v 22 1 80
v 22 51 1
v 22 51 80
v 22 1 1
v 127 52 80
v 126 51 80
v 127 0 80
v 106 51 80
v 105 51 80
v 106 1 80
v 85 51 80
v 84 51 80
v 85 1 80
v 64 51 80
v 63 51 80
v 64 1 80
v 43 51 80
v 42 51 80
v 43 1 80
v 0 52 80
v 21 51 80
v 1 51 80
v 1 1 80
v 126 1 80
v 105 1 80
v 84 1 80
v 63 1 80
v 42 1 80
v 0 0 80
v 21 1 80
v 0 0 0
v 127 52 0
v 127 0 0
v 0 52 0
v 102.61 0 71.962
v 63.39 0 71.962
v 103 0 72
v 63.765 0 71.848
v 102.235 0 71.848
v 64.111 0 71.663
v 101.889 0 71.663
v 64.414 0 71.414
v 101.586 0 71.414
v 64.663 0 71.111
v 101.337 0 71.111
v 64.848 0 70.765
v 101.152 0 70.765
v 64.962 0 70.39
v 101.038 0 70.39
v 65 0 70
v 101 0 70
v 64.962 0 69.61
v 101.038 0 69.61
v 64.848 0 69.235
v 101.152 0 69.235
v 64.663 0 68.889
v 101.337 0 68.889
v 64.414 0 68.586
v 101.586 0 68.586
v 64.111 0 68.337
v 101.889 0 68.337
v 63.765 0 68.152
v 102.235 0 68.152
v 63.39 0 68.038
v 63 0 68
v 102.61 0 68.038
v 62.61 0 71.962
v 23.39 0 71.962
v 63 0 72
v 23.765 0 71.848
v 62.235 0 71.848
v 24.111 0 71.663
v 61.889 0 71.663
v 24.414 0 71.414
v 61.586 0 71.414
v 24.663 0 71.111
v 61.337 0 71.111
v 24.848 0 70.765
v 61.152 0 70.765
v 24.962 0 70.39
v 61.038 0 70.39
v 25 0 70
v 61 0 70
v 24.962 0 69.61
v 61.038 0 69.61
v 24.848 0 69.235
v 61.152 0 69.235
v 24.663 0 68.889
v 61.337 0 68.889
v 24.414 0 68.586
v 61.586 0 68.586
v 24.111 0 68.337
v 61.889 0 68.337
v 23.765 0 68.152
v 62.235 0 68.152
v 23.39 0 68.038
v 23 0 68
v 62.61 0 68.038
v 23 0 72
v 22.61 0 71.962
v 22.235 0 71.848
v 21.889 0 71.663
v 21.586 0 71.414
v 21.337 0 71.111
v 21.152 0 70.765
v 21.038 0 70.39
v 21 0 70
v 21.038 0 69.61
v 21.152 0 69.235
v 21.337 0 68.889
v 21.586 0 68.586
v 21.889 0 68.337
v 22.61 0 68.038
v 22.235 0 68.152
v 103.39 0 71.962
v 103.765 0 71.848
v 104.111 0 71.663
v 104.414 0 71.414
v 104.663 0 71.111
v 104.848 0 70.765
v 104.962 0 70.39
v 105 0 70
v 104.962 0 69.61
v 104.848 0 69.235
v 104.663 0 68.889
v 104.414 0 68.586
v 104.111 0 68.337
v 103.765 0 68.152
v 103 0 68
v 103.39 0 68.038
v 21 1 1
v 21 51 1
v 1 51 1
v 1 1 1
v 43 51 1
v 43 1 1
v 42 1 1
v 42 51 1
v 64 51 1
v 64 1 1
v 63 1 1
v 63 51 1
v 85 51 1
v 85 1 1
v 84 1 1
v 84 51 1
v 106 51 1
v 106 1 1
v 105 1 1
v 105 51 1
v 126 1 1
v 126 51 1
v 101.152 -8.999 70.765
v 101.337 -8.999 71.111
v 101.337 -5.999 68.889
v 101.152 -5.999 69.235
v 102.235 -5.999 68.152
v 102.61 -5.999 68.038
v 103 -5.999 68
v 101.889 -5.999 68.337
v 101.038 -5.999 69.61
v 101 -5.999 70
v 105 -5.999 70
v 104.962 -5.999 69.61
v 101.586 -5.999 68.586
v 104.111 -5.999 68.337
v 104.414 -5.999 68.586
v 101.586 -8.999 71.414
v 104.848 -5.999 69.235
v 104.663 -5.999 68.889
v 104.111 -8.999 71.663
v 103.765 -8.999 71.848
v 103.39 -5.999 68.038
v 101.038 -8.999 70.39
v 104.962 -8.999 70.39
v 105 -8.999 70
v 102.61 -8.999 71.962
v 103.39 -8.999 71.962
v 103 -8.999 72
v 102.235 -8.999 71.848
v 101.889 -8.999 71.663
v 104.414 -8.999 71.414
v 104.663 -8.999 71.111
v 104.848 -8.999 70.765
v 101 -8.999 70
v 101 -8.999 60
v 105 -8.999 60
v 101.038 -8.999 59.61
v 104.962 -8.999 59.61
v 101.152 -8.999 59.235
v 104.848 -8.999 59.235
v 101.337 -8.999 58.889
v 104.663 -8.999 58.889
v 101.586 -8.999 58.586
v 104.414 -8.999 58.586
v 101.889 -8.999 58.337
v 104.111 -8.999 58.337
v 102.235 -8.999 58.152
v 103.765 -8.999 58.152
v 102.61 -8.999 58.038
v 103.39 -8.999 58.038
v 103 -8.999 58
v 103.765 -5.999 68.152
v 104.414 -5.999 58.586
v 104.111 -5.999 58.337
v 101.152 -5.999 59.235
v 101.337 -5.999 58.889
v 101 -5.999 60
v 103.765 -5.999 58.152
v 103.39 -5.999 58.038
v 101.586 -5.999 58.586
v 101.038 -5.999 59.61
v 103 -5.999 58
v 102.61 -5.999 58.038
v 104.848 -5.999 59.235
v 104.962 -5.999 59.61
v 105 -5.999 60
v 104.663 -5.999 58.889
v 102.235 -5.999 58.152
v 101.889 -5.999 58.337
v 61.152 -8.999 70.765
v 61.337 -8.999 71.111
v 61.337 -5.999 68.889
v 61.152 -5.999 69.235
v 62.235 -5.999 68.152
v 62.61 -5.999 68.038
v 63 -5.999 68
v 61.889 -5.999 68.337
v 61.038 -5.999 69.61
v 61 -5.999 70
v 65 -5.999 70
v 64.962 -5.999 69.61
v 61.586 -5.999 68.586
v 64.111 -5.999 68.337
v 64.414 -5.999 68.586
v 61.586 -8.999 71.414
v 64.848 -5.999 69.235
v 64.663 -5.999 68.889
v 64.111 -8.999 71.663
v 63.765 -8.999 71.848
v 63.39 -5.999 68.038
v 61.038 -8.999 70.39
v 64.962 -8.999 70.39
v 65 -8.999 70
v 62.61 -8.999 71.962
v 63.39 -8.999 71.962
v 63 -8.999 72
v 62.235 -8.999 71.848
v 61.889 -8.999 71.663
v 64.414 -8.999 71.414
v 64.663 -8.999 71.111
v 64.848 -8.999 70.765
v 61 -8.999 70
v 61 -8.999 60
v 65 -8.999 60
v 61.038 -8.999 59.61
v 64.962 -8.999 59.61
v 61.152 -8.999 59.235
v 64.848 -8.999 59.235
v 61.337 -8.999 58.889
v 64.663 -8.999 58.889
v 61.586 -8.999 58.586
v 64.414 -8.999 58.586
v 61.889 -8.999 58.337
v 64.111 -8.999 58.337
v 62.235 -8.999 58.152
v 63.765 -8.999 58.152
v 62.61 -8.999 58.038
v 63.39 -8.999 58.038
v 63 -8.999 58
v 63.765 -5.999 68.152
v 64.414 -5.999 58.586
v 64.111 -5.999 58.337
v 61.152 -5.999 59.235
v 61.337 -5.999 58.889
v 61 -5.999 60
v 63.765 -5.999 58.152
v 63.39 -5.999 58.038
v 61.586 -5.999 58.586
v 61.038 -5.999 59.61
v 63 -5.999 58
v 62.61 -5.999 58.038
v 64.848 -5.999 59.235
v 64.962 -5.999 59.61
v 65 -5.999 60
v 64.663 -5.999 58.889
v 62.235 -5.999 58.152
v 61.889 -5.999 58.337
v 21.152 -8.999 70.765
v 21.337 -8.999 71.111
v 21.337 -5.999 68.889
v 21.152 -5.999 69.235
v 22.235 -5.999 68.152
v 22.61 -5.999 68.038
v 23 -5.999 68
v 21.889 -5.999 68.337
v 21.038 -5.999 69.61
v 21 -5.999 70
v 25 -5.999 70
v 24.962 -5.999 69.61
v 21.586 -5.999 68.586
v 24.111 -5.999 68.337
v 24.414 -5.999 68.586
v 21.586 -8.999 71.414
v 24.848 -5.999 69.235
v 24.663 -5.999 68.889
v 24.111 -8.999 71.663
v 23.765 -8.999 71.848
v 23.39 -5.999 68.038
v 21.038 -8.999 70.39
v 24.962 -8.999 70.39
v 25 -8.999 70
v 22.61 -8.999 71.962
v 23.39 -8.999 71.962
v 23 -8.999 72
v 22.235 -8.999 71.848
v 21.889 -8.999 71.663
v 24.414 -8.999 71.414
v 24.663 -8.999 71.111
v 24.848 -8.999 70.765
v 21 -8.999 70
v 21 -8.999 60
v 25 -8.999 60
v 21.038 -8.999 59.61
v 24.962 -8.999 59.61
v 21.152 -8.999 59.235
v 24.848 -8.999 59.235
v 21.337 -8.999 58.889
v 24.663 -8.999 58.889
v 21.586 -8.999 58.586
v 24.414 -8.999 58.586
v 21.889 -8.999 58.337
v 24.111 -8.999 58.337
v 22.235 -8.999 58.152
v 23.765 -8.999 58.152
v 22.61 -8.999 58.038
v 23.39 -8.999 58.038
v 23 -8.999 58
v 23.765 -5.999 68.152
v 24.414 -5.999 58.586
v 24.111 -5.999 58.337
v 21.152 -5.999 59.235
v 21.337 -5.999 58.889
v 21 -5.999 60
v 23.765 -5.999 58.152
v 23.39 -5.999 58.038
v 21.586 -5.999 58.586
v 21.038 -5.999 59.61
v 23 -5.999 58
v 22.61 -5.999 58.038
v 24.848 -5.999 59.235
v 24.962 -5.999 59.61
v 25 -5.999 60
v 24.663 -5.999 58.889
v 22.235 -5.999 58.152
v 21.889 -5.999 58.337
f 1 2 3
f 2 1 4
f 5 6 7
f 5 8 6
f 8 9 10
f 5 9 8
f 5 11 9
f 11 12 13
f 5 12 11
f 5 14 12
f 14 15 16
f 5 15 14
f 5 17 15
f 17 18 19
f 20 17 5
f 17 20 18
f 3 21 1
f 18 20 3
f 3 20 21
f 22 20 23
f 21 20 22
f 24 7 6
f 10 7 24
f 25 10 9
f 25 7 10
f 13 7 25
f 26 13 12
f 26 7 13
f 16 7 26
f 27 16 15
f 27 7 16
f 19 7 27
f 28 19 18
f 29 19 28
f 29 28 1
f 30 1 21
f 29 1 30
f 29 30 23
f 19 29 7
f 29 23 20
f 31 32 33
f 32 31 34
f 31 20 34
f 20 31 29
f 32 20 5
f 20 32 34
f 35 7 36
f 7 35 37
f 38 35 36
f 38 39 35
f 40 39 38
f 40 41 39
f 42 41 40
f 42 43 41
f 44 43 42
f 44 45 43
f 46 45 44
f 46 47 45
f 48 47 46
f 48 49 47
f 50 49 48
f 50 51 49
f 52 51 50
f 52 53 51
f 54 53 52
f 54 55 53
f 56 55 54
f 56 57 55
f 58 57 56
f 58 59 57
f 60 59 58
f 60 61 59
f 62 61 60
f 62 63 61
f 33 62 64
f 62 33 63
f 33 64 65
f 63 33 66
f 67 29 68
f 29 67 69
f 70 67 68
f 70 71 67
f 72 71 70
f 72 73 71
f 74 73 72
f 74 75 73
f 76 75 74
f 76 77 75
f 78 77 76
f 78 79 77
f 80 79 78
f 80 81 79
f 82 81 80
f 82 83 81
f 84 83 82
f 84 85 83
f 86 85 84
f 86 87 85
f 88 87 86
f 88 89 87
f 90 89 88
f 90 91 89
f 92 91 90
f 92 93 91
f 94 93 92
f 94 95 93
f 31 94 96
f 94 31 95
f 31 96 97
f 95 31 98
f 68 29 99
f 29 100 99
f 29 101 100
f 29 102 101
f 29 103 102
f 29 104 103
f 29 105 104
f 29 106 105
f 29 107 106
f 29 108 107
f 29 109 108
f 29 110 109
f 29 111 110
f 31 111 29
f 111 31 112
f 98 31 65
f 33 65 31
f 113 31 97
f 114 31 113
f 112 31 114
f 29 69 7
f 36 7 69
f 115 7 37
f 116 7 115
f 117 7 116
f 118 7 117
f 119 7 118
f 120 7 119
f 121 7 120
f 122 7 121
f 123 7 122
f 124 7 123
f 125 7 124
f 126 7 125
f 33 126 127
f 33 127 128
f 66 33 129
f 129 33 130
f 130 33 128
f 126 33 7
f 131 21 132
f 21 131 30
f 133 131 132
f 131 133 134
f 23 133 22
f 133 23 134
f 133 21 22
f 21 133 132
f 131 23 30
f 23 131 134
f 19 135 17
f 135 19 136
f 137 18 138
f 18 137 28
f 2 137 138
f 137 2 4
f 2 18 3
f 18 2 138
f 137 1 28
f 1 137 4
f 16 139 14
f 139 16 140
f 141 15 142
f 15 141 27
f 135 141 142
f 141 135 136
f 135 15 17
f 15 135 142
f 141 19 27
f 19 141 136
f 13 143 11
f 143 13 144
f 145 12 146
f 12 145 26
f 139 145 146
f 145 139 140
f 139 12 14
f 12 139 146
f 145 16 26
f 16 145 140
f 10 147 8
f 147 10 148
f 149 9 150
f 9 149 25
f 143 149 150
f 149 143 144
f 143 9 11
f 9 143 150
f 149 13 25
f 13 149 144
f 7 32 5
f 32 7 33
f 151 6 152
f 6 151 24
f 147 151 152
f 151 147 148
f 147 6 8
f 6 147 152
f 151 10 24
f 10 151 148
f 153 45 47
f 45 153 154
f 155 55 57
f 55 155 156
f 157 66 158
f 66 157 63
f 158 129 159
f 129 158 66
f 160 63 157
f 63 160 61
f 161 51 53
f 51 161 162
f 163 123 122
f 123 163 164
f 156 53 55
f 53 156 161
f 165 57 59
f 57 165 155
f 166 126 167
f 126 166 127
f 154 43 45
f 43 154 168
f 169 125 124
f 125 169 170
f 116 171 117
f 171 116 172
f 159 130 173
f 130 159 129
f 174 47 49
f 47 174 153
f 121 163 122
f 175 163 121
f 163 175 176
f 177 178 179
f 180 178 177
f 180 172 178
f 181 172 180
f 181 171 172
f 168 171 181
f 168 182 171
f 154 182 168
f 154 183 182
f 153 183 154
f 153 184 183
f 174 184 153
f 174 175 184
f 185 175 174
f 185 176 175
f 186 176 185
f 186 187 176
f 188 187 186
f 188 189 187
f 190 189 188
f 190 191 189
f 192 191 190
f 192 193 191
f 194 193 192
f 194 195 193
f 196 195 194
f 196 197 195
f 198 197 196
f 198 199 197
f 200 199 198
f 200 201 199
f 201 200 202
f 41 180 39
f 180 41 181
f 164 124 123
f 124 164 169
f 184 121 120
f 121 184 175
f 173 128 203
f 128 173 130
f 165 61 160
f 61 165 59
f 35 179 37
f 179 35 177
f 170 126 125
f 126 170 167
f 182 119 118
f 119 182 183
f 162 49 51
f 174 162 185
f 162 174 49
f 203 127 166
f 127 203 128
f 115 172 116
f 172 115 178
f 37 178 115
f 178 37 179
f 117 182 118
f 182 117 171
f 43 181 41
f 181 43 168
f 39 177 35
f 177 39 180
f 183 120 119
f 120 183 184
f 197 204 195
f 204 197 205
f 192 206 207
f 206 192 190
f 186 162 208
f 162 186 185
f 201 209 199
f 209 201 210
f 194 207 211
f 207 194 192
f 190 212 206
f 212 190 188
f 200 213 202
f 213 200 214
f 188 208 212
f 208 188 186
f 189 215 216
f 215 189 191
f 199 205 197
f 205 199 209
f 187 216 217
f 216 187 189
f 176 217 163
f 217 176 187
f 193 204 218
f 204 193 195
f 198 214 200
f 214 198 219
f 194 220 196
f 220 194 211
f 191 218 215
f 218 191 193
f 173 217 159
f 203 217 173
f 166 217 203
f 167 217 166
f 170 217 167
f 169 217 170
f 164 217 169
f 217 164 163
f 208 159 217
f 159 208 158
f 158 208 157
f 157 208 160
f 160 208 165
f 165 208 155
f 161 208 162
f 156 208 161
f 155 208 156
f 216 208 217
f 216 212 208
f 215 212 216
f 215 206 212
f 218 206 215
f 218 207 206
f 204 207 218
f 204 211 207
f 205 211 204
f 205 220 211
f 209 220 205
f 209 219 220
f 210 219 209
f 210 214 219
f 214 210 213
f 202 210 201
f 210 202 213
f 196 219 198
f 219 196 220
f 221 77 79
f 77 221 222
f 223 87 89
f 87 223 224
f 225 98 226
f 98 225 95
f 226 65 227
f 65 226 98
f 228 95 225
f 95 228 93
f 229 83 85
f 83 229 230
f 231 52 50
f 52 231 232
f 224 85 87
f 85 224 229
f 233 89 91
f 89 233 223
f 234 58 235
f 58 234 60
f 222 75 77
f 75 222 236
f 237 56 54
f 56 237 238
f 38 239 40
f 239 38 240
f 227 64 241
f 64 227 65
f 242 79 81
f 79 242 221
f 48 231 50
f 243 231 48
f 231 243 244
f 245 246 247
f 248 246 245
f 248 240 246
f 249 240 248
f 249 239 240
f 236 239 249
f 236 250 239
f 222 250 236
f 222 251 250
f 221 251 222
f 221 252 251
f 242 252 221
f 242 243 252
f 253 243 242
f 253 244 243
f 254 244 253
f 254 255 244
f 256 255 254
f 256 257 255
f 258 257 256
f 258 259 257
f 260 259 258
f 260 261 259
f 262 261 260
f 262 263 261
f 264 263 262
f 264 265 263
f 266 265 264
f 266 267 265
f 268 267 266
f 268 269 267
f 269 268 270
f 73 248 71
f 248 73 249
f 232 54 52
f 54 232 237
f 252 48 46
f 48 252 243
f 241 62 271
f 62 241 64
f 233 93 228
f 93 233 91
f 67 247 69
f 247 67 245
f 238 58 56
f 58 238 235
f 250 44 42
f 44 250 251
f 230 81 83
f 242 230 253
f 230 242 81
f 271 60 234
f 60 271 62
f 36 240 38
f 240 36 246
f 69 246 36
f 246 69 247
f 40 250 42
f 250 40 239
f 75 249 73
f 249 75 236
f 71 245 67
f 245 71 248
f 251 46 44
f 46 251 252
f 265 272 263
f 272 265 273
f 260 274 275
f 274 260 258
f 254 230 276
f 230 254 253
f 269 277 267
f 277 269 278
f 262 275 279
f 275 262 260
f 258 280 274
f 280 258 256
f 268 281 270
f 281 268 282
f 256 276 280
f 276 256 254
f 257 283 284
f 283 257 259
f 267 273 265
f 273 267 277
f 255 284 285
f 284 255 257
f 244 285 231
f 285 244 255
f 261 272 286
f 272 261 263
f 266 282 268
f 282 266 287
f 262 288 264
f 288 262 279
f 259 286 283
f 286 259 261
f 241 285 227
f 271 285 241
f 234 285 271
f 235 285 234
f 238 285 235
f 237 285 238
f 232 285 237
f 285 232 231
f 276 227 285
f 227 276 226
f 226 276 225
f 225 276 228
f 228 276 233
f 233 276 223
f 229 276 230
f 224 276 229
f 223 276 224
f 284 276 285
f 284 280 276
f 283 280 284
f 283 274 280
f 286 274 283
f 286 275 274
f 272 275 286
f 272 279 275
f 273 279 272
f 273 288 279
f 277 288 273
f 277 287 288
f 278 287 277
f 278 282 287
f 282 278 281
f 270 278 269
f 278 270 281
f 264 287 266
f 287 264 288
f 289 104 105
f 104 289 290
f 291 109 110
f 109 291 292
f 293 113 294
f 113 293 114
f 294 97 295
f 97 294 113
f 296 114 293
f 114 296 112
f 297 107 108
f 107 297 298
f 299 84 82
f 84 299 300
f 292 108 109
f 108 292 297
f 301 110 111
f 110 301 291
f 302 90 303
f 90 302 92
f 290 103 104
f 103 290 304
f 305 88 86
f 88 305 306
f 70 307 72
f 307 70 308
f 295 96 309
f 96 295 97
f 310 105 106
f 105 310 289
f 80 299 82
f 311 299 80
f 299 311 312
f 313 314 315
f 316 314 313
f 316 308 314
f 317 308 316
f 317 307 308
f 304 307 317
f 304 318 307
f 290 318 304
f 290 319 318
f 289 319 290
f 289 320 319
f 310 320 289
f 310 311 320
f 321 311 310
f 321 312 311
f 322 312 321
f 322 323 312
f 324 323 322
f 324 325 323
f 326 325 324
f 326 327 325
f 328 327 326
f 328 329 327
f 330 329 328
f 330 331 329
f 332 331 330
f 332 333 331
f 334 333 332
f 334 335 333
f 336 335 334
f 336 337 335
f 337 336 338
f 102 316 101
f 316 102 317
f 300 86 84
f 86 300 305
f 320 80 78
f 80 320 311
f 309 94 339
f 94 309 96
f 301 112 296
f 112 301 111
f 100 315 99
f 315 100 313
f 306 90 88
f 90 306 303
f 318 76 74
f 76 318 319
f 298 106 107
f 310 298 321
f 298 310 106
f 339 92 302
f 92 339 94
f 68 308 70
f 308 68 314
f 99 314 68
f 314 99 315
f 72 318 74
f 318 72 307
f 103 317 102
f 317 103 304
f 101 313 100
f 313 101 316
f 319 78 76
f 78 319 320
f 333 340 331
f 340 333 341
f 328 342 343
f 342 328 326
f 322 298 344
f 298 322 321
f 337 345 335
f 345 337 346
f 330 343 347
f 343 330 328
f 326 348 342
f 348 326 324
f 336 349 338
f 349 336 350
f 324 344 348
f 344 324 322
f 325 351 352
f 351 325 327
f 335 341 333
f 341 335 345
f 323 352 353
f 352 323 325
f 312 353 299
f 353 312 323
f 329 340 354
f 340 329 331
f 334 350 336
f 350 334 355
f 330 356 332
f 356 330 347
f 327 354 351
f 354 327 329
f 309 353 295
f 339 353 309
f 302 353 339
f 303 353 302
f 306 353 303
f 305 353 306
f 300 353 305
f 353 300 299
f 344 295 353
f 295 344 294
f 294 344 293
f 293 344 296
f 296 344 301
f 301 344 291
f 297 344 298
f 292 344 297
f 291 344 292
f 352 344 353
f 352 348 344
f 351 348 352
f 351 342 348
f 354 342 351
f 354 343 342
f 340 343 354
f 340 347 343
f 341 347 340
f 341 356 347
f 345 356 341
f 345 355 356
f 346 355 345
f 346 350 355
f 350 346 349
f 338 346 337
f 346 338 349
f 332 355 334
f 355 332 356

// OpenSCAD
// file: gancho.scad
module ganchos(n=1){    
    for (i=[0:1:n-1]){
        translate([0,40*i,,0]) rotate([0, 90, 0]) translate([0, 0, -9]) {
            cylinder(d = 4, h=9, $fn = 32);
            hull(){
                cylinder(d = 4, h=3, $fn = 32);
                translate([10, 0, 0]) cylinder(d = 4, h=3, $fn = 32);
            } 
        }
    }   
}

// ganchos(3);
// main file
include <gancho.scad>

h = 80;

for (i=[0:5]) {
    translate([i*21,0,0]) difference() {
        cube([22,52, h], center = false);
        translate([1,1,1]) cube([20,50, h], center = false);
    }
}

translate([40 * 2 + (6*21 - 40*2)/2, 0.001, h-10]) rotate([0,0,90]) ganchos(3);
